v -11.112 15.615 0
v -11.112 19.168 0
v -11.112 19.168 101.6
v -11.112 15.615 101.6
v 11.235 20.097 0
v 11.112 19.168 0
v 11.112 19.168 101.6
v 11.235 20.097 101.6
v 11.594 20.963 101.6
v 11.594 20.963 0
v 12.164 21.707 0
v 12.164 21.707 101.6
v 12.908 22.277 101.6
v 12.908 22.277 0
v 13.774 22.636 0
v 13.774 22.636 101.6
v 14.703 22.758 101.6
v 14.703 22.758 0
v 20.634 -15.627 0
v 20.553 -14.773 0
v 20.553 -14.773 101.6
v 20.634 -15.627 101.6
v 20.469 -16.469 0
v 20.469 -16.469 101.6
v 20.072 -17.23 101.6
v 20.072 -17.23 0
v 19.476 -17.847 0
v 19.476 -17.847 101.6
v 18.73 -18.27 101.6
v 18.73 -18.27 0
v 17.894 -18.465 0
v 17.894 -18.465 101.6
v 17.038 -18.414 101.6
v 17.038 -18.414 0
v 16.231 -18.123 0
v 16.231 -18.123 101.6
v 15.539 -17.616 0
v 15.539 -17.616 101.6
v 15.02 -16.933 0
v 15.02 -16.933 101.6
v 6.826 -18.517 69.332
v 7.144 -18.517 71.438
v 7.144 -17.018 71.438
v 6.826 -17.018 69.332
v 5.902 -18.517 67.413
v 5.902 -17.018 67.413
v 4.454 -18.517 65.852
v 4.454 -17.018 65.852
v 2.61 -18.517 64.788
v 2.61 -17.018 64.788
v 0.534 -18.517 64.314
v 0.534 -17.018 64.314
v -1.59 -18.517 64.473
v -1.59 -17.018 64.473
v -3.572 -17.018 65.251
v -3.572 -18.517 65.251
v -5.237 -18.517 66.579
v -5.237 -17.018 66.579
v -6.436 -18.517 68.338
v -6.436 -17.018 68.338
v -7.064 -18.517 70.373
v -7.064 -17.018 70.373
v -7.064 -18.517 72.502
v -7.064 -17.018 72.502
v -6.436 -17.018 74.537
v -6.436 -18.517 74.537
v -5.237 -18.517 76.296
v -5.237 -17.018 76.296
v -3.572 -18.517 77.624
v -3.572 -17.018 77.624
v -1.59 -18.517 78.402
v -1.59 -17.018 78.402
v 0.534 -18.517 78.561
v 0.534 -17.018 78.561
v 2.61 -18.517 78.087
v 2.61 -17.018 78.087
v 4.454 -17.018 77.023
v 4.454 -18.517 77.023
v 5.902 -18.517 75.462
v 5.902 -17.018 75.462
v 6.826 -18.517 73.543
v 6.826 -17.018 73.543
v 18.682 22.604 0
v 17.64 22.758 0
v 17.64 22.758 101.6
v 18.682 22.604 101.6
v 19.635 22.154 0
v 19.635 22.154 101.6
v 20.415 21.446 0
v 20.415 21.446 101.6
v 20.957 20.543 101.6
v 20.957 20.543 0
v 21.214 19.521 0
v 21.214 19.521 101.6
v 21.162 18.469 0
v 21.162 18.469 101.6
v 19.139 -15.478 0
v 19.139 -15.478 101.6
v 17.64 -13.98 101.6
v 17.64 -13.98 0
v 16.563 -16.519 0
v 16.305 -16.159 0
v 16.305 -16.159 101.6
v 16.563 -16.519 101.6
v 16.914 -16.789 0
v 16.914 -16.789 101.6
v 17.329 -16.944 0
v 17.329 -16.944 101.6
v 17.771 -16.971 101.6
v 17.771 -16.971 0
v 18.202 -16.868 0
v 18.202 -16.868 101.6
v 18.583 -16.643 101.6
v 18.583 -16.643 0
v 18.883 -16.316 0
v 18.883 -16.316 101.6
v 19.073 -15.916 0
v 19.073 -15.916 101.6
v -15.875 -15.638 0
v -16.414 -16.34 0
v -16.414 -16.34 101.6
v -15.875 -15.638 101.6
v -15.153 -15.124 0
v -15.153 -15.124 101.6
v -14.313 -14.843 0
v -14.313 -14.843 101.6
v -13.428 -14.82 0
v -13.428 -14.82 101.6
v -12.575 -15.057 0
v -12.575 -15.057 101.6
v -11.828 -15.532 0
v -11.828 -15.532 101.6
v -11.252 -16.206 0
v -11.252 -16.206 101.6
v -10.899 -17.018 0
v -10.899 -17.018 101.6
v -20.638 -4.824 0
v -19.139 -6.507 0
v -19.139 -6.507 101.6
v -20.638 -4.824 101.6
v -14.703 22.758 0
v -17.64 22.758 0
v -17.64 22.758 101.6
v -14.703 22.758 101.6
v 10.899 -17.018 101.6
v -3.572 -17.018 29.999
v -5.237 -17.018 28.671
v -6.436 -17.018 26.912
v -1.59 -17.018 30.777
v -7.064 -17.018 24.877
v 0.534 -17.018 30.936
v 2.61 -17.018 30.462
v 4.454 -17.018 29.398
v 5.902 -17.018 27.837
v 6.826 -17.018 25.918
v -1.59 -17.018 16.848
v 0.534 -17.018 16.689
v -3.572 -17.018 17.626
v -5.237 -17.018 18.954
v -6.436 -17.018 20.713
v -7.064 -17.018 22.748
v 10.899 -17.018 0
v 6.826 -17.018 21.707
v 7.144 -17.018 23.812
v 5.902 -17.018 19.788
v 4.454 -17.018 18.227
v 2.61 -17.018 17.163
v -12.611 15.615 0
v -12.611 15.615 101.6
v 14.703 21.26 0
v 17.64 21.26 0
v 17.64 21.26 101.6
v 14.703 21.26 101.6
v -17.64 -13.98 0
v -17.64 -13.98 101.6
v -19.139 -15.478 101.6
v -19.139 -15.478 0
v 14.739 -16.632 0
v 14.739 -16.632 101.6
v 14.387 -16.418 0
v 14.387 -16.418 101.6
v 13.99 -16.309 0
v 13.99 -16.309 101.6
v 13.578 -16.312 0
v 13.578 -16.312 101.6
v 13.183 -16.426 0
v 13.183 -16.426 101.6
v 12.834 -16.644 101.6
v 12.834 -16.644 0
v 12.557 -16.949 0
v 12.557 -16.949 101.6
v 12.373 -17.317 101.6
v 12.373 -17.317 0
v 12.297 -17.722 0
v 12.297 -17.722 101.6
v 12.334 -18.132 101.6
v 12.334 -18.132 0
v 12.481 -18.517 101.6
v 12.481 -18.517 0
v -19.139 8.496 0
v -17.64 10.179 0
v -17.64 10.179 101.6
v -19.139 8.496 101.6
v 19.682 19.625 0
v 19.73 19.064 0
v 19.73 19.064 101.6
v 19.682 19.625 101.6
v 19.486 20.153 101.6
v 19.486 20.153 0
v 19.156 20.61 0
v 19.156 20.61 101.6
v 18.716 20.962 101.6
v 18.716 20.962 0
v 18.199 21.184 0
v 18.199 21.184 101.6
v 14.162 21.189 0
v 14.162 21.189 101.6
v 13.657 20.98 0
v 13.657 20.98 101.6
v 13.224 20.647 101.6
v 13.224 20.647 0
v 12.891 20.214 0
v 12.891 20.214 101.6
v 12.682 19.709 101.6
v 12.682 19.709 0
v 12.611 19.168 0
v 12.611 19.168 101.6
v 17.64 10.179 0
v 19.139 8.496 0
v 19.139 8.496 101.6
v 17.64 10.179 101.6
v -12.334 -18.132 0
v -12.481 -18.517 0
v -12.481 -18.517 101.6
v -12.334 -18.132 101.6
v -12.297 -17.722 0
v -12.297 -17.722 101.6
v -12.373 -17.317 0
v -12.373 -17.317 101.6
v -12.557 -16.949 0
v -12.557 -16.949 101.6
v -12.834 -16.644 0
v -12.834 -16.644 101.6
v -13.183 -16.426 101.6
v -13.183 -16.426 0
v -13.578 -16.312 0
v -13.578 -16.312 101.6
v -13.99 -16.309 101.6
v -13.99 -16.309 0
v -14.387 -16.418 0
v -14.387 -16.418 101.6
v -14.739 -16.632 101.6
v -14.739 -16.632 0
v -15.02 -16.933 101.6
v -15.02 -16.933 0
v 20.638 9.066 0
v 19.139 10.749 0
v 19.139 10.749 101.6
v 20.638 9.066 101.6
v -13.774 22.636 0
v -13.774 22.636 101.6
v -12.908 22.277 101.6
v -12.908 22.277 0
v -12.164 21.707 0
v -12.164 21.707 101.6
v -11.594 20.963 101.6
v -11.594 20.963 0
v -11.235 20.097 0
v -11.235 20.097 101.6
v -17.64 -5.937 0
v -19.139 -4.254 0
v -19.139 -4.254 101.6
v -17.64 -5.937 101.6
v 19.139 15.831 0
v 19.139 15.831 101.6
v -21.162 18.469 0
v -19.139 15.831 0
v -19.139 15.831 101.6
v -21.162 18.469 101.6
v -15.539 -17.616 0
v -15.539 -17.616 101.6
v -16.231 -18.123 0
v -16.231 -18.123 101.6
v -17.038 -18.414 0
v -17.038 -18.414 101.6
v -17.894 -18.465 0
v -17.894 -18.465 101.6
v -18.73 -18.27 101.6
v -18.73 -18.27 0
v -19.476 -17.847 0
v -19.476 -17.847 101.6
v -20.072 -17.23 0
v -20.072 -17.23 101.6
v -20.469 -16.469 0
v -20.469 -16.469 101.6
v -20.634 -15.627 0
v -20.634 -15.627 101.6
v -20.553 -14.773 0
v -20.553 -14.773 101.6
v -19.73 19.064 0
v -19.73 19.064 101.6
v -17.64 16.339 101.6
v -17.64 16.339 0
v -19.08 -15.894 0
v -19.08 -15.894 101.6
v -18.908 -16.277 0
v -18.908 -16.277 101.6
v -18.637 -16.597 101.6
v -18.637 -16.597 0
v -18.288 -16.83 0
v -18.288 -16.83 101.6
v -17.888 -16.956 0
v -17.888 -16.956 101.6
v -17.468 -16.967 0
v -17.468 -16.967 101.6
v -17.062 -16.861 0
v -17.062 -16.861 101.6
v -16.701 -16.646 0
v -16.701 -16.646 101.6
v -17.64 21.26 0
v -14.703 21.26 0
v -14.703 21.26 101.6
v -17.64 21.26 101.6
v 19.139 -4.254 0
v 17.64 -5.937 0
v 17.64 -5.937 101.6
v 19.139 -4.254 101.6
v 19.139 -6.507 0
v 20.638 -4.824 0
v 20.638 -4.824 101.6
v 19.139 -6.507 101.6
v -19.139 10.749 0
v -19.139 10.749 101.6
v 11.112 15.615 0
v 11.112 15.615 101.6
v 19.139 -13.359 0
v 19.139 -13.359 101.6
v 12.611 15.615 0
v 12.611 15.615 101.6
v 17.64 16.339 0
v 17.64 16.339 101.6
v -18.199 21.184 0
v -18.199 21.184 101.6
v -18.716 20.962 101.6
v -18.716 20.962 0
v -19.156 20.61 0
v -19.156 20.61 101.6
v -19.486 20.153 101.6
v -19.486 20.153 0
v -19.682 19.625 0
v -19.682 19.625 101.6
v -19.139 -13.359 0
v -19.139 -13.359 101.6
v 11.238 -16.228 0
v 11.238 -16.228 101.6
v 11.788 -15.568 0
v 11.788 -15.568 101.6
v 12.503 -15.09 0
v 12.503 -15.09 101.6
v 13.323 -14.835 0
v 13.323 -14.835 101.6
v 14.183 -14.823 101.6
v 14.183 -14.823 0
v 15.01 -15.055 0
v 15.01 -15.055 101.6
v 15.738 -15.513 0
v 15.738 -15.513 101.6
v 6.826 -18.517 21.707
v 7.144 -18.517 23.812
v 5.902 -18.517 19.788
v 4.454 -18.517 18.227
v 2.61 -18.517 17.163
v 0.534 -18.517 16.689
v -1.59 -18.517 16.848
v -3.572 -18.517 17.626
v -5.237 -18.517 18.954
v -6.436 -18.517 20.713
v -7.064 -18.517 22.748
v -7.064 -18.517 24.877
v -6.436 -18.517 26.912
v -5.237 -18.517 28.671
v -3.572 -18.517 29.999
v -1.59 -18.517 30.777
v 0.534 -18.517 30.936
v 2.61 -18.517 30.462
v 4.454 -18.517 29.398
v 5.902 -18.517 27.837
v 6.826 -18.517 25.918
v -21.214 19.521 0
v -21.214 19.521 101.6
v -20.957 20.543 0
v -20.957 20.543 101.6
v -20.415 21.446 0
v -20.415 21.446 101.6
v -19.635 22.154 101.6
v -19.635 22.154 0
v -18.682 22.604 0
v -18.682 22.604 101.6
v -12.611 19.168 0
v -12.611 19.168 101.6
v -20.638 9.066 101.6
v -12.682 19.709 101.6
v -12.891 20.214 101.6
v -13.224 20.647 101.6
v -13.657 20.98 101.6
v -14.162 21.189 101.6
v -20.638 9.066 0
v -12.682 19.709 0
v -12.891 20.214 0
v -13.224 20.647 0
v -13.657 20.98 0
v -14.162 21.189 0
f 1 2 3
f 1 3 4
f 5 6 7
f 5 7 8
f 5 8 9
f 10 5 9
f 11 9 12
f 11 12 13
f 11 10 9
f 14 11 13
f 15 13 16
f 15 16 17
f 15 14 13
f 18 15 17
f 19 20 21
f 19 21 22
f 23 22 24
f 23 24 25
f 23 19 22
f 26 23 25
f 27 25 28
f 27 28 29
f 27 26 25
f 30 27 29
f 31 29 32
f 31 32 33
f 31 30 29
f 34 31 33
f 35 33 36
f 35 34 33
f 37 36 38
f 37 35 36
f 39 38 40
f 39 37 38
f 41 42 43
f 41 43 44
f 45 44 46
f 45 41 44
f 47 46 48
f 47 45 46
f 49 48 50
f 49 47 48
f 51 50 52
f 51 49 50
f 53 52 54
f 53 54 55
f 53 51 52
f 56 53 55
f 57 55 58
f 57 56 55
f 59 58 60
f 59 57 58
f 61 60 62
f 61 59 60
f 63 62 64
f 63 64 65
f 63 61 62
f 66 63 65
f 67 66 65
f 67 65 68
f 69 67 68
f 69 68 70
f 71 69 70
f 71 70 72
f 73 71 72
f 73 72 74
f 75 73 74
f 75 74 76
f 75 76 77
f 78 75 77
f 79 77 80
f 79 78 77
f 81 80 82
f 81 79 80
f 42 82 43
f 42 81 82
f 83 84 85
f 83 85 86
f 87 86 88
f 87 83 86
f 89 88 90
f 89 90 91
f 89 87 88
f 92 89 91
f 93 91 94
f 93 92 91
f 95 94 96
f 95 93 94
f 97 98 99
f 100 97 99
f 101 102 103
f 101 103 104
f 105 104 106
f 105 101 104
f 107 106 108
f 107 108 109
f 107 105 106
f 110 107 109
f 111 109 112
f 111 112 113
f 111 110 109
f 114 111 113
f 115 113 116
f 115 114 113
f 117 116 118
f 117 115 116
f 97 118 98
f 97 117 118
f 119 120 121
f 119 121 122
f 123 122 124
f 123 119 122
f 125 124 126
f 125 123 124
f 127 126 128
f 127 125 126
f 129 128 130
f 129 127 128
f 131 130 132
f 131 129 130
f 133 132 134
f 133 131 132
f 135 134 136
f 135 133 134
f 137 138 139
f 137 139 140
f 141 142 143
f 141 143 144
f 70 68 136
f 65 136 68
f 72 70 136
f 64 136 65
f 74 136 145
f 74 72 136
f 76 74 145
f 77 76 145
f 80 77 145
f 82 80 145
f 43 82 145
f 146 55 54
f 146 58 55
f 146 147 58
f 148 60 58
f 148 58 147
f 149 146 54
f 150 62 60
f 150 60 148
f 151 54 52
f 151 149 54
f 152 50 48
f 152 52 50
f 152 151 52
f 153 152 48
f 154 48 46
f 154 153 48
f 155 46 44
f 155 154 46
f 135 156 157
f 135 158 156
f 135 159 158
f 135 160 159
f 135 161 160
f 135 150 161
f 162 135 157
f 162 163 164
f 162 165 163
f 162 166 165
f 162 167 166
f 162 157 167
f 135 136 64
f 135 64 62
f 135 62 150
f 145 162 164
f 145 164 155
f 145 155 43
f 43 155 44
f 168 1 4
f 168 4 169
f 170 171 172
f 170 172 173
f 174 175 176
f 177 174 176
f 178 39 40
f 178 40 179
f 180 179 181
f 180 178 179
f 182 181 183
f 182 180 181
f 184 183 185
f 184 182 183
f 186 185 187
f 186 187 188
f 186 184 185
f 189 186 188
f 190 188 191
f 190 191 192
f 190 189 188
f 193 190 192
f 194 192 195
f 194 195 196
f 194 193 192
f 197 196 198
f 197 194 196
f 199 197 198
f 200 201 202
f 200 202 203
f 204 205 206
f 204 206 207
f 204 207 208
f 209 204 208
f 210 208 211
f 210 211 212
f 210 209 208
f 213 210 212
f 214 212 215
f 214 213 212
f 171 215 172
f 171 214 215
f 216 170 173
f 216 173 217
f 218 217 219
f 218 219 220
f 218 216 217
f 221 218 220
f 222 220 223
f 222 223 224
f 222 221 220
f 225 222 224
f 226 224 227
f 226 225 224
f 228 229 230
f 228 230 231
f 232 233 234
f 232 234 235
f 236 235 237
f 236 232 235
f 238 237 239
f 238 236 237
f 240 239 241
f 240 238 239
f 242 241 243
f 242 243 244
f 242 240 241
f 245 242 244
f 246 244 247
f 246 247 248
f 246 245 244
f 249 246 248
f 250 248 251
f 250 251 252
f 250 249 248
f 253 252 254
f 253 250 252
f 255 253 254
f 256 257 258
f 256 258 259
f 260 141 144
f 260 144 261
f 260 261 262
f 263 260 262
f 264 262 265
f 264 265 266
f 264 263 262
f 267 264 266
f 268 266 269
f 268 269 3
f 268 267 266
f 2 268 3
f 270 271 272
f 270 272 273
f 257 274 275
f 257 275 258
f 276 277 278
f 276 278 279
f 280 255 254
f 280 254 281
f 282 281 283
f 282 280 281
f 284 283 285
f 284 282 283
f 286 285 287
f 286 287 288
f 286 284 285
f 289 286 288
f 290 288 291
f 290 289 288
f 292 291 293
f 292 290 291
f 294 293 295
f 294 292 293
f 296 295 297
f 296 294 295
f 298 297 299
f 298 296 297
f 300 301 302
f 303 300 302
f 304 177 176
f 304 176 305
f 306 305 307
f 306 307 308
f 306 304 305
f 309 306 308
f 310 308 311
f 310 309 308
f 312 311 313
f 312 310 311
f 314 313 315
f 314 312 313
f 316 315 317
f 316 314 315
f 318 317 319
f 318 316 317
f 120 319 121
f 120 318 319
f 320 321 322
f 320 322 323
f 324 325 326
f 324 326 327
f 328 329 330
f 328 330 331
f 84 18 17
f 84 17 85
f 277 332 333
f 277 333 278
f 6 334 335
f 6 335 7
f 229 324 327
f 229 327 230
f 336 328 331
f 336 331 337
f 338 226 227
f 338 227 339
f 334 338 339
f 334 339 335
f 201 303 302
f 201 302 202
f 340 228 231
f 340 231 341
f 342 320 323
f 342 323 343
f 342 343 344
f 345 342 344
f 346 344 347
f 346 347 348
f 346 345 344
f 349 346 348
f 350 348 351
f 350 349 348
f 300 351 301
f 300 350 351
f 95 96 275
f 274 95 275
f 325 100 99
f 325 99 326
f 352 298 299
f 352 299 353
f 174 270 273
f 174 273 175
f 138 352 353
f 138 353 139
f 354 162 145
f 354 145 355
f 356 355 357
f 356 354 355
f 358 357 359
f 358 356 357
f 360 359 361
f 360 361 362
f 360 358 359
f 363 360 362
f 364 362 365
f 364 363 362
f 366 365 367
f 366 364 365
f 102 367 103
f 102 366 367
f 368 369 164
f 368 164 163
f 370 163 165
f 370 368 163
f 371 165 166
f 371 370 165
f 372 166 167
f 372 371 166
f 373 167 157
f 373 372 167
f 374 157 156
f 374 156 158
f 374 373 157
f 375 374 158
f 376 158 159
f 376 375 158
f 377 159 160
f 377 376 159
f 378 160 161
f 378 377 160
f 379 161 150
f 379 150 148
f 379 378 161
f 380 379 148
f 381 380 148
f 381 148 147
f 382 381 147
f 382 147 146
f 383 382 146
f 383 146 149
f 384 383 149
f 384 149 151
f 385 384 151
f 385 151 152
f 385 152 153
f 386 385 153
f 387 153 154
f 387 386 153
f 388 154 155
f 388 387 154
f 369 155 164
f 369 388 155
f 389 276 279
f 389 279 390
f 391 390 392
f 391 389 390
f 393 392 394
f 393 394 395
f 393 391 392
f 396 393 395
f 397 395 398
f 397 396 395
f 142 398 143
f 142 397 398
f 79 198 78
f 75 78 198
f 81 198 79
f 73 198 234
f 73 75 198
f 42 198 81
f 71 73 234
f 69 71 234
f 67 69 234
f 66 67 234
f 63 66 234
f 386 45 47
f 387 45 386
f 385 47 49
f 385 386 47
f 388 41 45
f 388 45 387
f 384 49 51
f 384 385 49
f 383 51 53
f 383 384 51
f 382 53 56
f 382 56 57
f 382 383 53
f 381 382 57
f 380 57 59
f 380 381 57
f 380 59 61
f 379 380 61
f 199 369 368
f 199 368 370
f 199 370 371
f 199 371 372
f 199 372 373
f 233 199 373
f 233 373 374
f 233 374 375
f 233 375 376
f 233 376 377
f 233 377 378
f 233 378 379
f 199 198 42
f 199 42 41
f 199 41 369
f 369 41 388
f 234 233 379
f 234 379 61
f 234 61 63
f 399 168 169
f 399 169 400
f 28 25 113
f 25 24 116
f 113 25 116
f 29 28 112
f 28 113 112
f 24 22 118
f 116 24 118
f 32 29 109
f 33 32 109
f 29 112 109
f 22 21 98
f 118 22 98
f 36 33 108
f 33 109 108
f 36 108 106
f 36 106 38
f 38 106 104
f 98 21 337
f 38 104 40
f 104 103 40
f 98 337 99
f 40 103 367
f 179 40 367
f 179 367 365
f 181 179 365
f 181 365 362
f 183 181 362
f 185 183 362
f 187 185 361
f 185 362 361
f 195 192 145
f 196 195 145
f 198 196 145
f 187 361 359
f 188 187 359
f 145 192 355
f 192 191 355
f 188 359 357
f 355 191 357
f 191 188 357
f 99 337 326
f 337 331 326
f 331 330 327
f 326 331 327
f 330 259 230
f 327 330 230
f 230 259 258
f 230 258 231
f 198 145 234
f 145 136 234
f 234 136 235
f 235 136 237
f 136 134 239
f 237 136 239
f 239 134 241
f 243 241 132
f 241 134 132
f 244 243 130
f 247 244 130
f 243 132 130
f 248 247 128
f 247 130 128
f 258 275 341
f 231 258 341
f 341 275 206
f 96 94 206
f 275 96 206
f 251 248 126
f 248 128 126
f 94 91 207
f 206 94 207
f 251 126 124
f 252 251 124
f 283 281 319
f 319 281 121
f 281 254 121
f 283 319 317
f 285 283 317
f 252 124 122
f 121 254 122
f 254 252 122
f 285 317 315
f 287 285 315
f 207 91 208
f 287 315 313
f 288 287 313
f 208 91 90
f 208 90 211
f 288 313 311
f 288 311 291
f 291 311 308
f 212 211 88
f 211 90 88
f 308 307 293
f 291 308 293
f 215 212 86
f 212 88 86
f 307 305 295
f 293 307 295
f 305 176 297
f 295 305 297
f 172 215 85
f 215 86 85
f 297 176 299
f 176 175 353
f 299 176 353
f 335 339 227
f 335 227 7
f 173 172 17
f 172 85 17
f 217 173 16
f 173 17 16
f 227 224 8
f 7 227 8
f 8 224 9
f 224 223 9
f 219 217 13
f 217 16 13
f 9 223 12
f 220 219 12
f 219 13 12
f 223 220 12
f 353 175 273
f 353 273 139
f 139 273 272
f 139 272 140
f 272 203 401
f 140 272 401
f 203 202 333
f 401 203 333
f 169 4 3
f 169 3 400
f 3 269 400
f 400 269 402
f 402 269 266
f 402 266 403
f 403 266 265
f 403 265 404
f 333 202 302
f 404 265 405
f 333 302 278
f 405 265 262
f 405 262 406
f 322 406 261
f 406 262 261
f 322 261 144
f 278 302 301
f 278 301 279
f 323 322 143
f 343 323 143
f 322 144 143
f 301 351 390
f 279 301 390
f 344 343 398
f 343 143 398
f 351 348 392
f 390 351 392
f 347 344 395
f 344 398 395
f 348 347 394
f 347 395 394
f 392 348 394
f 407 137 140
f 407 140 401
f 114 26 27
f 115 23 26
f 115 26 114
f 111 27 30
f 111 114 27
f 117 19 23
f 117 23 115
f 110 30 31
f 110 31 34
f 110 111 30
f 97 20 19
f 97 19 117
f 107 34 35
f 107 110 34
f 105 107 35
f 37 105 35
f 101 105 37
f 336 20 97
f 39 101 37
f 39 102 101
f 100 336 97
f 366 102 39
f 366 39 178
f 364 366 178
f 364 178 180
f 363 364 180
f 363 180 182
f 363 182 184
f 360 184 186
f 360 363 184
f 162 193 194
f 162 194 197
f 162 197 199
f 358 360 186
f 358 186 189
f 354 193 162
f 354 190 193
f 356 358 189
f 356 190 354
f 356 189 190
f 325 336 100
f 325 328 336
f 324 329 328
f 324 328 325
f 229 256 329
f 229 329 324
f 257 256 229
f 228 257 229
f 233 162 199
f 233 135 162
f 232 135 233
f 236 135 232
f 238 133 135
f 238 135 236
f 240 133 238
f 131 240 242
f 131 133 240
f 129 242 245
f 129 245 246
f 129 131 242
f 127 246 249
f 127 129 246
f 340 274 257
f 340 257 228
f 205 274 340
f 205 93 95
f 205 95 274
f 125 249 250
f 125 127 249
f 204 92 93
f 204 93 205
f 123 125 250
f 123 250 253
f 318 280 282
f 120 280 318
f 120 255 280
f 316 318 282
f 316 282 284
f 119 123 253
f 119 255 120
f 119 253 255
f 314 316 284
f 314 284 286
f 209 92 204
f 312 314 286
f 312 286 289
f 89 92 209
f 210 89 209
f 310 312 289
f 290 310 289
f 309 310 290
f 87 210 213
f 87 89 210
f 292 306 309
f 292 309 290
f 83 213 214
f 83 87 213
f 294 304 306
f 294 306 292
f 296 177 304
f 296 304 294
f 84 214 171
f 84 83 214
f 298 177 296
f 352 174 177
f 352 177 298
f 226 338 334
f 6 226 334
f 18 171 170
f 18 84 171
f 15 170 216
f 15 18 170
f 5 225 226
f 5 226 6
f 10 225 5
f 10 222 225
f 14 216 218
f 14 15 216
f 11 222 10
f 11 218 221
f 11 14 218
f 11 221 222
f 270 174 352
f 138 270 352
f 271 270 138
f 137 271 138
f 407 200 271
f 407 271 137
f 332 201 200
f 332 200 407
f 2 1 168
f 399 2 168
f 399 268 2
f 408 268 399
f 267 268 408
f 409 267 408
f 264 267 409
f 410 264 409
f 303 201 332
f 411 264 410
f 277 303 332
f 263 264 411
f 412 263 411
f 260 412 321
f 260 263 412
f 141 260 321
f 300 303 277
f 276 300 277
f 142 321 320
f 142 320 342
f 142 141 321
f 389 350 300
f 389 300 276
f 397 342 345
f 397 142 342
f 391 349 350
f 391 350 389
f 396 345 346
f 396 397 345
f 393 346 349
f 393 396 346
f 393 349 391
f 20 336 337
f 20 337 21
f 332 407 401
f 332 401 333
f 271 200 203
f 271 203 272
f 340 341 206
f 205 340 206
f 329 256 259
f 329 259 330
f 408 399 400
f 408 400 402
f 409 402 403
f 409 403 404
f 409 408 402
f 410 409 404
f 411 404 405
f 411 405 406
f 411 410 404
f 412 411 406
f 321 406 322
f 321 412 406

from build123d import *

# Parameters (mm, degrees)
BASE_EXTRUDE_DEPTH = 101.6
HOLE1_START        = -18.5166
HOLE1_OUTLINE_R    = 7.14375
HOLE1_DEPTH        = 1.4986
LPATTERN2_COUNT    = 2
LPATTERN2_PITCH    = 47.625


# Read off the part's stored shape, not the designer's step: Hole1
with BuildPart() as part:
    # Sketch1 → Base-Extrude (new body)
    with BuildSketch(Plane.XY):
        with BuildLine():
            Line((17.6403, 16.339286512), (19.729882578, 19.063533504))
            ThreePointArc((19.729882578, 19.063533504), (19.156045845, 20.609744632), (17.6403, 21.2598))
            Line((17.6403, 21.2598), (14.70327367, 21.2598))
            ThreePointArc((14.70327367, 21.2598), (13.223883481, 20.647016519), (12.6111, 19.16762633))
            Line((12.6111, 19.16762633), (12.6111, 15.61465))
            Line((12.6111, 15.61465), (11.1125, 15.61465))
            Line((11.1125, 15.61465), (11.1125, 19.16762633))
            ThreePointArc((11.1125, 19.16762633), (12.164213258, 21.706686742), (14.70327367, 22.7584))
            Line((14.70327367, 22.7584), (17.6403, 22.7584))
            ThreePointArc((17.6403, 22.7584), (20.415434554, 21.446284653), (21.162428673, 18.4688666))
            Line((21.162428673, 18.4688666), (19.1389, 15.830735923))
            Line((19.1389, 15.830735923), (19.1389, 10.749129415))
            Line((19.1389, 10.749129415), (20.6375, 9.0662125))
            Line((20.6375, 9.0662125), (20.6375, -4.8244125))
            Line((20.6375, -4.8244125), (19.1389, -6.507329415))
            Line((19.1389, -6.507329415), (19.1389, -13.358784555))
            Line((19.1389, -13.358784555), (20.553458003, -14.773342558))
            ThreePointArc((20.553458003, -14.773342558), (18.729942105, -18.270236732), (15.019825564, -16.932883251))
            ThreePointArc((15.019825564, -16.932883251), (13.000752562, -16.523120627), (12.480559153, -18.5166))
            Line((12.480559153, -18.5166), (-12.480559153, -18.5166))
            ThreePointArc((-12.480559153, -18.5166), (-13.000752562, -16.523120627), (-15.019825564, -16.932883251))
            ThreePointArc((-15.019825564, -16.932883251), (-18.729942105, -18.270236732), (-20.553458003, -14.773342558))
            Line((-20.553458003, -14.773342558), (-19.1389, -13.358784555))
            Line((-19.1389, -13.358784555), (-19.1389, -6.507329415))
            Line((-19.1389, -6.507329415), (-20.6375, -4.8244125))
            Line((-20.6375, -4.8244125), (-20.6375, 9.0662125))
            Line((-20.6375, 9.0662125), (-19.1389, 10.749129415))
            Line((-19.1389, 10.749129415), (-19.1389, 15.830735923))
            Line((-19.1389, 15.830735923), (-21.162428673, 18.4688666))
            ThreePointArc((-21.162428673, 18.4688666), (-20.415434554, 21.446284653), (-17.6403, 22.7584))
            Line((-17.6403, 22.7584), (-14.70327367, 22.7584))
            ThreePointArc((-14.70327367, 22.7584), (-12.164213258, 21.706686742), (-11.1125, 19.16762633))
            Line((-11.1125, 19.16762633), (-11.1125, 15.61465))
            Line((-11.1125, 15.61465), (-12.6111, 15.61465))
            Line((-12.6111, 15.61465), (-12.6111, 19.16762633))
            ThreePointArc((-12.6111, 19.16762633), (-13.223883481, 20.647016519), (-14.70327367, 21.2598))
            Line((-14.70327367, 21.2598), (-17.6403, 21.2598))
            ThreePointArc((-17.6403, 21.2598), (-19.156045845, 20.609744632), (-19.729882578, 19.063533504))
            Line((-19.729882578, 19.063533504), (-17.6403, 16.339286512))
            Line((-17.6403, 16.339286512), (-17.6403, 10.17860201))
            Line((-17.6403, 10.17860201), (-19.1389, 8.495685095))
            Line((-19.1389, 8.495685095), (-19.1389, -4.253885095))
            Line((-19.1389, -4.253885095), (-17.6403, -5.93680201))
            Line((-17.6403, -5.93680201), (-17.6403, -13.979525))
            Line((-17.6403, -13.979525), (-19.1389, -15.478125))
            ThreePointArc((-19.1389, -15.478125), (-18.092238669, -16.906954381), (-16.414285827, -16.33992034))
            ThreePointArc((-16.414285827, -16.33992034), (-13.428073412, -14.819877156), (-10.898992189, -17.018))
            Line((-10.898992189, -17.018), (10.898992189, -17.018))
            ThreePointArc((10.898992189, -17.018), (13.323359075, -14.834630878), (16.30518861, -16.15877141))
            ThreePointArc((16.30518861, -16.15877141), (17.990302879, -16.935279743), (19.1389, -15.478125))
            Line((19.1389, -15.478125), (17.6403, -13.979525))
            Line((17.6403, -13.979525), (17.6403, -5.93680201))
            Line((17.6403, -5.93680201), (19.1389, -4.253885095))
            Line((19.1389, -4.253885095), (19.1389, 8.495685095))
            Line((19.1389, 8.495685095), (17.6403, 10.17860201))
            Line((17.6403, 10.17860201), (17.6403, 16.339286512))
        make_face()
    extrude(amount=BASE_EXTRUDE_DEPTH)

    # Hole1 outline → Hole1 (cut)
    with BuildSketch(Plane(origin=(0, 0, 0), x_dir=(1, 0, 0), z_dir=(0, 1, 0)).offset(HOLE1_START)):
        with Locations((0, -23.8125)):
            Circle(HOLE1_OUTLINE_R)
    hole1 = extrude(amount=HOLE1_DEPTH, mode=Mode.SUBTRACT)

    # LPattern2: Hole1 ×2
    with Locations(*[(0, 0, i * LPATTERN2_PITCH) for i in range(1, LPATTERN2_COUNT)]):
        add(hole1, mode=Mode.SUBTRACT)


solid = part.part
